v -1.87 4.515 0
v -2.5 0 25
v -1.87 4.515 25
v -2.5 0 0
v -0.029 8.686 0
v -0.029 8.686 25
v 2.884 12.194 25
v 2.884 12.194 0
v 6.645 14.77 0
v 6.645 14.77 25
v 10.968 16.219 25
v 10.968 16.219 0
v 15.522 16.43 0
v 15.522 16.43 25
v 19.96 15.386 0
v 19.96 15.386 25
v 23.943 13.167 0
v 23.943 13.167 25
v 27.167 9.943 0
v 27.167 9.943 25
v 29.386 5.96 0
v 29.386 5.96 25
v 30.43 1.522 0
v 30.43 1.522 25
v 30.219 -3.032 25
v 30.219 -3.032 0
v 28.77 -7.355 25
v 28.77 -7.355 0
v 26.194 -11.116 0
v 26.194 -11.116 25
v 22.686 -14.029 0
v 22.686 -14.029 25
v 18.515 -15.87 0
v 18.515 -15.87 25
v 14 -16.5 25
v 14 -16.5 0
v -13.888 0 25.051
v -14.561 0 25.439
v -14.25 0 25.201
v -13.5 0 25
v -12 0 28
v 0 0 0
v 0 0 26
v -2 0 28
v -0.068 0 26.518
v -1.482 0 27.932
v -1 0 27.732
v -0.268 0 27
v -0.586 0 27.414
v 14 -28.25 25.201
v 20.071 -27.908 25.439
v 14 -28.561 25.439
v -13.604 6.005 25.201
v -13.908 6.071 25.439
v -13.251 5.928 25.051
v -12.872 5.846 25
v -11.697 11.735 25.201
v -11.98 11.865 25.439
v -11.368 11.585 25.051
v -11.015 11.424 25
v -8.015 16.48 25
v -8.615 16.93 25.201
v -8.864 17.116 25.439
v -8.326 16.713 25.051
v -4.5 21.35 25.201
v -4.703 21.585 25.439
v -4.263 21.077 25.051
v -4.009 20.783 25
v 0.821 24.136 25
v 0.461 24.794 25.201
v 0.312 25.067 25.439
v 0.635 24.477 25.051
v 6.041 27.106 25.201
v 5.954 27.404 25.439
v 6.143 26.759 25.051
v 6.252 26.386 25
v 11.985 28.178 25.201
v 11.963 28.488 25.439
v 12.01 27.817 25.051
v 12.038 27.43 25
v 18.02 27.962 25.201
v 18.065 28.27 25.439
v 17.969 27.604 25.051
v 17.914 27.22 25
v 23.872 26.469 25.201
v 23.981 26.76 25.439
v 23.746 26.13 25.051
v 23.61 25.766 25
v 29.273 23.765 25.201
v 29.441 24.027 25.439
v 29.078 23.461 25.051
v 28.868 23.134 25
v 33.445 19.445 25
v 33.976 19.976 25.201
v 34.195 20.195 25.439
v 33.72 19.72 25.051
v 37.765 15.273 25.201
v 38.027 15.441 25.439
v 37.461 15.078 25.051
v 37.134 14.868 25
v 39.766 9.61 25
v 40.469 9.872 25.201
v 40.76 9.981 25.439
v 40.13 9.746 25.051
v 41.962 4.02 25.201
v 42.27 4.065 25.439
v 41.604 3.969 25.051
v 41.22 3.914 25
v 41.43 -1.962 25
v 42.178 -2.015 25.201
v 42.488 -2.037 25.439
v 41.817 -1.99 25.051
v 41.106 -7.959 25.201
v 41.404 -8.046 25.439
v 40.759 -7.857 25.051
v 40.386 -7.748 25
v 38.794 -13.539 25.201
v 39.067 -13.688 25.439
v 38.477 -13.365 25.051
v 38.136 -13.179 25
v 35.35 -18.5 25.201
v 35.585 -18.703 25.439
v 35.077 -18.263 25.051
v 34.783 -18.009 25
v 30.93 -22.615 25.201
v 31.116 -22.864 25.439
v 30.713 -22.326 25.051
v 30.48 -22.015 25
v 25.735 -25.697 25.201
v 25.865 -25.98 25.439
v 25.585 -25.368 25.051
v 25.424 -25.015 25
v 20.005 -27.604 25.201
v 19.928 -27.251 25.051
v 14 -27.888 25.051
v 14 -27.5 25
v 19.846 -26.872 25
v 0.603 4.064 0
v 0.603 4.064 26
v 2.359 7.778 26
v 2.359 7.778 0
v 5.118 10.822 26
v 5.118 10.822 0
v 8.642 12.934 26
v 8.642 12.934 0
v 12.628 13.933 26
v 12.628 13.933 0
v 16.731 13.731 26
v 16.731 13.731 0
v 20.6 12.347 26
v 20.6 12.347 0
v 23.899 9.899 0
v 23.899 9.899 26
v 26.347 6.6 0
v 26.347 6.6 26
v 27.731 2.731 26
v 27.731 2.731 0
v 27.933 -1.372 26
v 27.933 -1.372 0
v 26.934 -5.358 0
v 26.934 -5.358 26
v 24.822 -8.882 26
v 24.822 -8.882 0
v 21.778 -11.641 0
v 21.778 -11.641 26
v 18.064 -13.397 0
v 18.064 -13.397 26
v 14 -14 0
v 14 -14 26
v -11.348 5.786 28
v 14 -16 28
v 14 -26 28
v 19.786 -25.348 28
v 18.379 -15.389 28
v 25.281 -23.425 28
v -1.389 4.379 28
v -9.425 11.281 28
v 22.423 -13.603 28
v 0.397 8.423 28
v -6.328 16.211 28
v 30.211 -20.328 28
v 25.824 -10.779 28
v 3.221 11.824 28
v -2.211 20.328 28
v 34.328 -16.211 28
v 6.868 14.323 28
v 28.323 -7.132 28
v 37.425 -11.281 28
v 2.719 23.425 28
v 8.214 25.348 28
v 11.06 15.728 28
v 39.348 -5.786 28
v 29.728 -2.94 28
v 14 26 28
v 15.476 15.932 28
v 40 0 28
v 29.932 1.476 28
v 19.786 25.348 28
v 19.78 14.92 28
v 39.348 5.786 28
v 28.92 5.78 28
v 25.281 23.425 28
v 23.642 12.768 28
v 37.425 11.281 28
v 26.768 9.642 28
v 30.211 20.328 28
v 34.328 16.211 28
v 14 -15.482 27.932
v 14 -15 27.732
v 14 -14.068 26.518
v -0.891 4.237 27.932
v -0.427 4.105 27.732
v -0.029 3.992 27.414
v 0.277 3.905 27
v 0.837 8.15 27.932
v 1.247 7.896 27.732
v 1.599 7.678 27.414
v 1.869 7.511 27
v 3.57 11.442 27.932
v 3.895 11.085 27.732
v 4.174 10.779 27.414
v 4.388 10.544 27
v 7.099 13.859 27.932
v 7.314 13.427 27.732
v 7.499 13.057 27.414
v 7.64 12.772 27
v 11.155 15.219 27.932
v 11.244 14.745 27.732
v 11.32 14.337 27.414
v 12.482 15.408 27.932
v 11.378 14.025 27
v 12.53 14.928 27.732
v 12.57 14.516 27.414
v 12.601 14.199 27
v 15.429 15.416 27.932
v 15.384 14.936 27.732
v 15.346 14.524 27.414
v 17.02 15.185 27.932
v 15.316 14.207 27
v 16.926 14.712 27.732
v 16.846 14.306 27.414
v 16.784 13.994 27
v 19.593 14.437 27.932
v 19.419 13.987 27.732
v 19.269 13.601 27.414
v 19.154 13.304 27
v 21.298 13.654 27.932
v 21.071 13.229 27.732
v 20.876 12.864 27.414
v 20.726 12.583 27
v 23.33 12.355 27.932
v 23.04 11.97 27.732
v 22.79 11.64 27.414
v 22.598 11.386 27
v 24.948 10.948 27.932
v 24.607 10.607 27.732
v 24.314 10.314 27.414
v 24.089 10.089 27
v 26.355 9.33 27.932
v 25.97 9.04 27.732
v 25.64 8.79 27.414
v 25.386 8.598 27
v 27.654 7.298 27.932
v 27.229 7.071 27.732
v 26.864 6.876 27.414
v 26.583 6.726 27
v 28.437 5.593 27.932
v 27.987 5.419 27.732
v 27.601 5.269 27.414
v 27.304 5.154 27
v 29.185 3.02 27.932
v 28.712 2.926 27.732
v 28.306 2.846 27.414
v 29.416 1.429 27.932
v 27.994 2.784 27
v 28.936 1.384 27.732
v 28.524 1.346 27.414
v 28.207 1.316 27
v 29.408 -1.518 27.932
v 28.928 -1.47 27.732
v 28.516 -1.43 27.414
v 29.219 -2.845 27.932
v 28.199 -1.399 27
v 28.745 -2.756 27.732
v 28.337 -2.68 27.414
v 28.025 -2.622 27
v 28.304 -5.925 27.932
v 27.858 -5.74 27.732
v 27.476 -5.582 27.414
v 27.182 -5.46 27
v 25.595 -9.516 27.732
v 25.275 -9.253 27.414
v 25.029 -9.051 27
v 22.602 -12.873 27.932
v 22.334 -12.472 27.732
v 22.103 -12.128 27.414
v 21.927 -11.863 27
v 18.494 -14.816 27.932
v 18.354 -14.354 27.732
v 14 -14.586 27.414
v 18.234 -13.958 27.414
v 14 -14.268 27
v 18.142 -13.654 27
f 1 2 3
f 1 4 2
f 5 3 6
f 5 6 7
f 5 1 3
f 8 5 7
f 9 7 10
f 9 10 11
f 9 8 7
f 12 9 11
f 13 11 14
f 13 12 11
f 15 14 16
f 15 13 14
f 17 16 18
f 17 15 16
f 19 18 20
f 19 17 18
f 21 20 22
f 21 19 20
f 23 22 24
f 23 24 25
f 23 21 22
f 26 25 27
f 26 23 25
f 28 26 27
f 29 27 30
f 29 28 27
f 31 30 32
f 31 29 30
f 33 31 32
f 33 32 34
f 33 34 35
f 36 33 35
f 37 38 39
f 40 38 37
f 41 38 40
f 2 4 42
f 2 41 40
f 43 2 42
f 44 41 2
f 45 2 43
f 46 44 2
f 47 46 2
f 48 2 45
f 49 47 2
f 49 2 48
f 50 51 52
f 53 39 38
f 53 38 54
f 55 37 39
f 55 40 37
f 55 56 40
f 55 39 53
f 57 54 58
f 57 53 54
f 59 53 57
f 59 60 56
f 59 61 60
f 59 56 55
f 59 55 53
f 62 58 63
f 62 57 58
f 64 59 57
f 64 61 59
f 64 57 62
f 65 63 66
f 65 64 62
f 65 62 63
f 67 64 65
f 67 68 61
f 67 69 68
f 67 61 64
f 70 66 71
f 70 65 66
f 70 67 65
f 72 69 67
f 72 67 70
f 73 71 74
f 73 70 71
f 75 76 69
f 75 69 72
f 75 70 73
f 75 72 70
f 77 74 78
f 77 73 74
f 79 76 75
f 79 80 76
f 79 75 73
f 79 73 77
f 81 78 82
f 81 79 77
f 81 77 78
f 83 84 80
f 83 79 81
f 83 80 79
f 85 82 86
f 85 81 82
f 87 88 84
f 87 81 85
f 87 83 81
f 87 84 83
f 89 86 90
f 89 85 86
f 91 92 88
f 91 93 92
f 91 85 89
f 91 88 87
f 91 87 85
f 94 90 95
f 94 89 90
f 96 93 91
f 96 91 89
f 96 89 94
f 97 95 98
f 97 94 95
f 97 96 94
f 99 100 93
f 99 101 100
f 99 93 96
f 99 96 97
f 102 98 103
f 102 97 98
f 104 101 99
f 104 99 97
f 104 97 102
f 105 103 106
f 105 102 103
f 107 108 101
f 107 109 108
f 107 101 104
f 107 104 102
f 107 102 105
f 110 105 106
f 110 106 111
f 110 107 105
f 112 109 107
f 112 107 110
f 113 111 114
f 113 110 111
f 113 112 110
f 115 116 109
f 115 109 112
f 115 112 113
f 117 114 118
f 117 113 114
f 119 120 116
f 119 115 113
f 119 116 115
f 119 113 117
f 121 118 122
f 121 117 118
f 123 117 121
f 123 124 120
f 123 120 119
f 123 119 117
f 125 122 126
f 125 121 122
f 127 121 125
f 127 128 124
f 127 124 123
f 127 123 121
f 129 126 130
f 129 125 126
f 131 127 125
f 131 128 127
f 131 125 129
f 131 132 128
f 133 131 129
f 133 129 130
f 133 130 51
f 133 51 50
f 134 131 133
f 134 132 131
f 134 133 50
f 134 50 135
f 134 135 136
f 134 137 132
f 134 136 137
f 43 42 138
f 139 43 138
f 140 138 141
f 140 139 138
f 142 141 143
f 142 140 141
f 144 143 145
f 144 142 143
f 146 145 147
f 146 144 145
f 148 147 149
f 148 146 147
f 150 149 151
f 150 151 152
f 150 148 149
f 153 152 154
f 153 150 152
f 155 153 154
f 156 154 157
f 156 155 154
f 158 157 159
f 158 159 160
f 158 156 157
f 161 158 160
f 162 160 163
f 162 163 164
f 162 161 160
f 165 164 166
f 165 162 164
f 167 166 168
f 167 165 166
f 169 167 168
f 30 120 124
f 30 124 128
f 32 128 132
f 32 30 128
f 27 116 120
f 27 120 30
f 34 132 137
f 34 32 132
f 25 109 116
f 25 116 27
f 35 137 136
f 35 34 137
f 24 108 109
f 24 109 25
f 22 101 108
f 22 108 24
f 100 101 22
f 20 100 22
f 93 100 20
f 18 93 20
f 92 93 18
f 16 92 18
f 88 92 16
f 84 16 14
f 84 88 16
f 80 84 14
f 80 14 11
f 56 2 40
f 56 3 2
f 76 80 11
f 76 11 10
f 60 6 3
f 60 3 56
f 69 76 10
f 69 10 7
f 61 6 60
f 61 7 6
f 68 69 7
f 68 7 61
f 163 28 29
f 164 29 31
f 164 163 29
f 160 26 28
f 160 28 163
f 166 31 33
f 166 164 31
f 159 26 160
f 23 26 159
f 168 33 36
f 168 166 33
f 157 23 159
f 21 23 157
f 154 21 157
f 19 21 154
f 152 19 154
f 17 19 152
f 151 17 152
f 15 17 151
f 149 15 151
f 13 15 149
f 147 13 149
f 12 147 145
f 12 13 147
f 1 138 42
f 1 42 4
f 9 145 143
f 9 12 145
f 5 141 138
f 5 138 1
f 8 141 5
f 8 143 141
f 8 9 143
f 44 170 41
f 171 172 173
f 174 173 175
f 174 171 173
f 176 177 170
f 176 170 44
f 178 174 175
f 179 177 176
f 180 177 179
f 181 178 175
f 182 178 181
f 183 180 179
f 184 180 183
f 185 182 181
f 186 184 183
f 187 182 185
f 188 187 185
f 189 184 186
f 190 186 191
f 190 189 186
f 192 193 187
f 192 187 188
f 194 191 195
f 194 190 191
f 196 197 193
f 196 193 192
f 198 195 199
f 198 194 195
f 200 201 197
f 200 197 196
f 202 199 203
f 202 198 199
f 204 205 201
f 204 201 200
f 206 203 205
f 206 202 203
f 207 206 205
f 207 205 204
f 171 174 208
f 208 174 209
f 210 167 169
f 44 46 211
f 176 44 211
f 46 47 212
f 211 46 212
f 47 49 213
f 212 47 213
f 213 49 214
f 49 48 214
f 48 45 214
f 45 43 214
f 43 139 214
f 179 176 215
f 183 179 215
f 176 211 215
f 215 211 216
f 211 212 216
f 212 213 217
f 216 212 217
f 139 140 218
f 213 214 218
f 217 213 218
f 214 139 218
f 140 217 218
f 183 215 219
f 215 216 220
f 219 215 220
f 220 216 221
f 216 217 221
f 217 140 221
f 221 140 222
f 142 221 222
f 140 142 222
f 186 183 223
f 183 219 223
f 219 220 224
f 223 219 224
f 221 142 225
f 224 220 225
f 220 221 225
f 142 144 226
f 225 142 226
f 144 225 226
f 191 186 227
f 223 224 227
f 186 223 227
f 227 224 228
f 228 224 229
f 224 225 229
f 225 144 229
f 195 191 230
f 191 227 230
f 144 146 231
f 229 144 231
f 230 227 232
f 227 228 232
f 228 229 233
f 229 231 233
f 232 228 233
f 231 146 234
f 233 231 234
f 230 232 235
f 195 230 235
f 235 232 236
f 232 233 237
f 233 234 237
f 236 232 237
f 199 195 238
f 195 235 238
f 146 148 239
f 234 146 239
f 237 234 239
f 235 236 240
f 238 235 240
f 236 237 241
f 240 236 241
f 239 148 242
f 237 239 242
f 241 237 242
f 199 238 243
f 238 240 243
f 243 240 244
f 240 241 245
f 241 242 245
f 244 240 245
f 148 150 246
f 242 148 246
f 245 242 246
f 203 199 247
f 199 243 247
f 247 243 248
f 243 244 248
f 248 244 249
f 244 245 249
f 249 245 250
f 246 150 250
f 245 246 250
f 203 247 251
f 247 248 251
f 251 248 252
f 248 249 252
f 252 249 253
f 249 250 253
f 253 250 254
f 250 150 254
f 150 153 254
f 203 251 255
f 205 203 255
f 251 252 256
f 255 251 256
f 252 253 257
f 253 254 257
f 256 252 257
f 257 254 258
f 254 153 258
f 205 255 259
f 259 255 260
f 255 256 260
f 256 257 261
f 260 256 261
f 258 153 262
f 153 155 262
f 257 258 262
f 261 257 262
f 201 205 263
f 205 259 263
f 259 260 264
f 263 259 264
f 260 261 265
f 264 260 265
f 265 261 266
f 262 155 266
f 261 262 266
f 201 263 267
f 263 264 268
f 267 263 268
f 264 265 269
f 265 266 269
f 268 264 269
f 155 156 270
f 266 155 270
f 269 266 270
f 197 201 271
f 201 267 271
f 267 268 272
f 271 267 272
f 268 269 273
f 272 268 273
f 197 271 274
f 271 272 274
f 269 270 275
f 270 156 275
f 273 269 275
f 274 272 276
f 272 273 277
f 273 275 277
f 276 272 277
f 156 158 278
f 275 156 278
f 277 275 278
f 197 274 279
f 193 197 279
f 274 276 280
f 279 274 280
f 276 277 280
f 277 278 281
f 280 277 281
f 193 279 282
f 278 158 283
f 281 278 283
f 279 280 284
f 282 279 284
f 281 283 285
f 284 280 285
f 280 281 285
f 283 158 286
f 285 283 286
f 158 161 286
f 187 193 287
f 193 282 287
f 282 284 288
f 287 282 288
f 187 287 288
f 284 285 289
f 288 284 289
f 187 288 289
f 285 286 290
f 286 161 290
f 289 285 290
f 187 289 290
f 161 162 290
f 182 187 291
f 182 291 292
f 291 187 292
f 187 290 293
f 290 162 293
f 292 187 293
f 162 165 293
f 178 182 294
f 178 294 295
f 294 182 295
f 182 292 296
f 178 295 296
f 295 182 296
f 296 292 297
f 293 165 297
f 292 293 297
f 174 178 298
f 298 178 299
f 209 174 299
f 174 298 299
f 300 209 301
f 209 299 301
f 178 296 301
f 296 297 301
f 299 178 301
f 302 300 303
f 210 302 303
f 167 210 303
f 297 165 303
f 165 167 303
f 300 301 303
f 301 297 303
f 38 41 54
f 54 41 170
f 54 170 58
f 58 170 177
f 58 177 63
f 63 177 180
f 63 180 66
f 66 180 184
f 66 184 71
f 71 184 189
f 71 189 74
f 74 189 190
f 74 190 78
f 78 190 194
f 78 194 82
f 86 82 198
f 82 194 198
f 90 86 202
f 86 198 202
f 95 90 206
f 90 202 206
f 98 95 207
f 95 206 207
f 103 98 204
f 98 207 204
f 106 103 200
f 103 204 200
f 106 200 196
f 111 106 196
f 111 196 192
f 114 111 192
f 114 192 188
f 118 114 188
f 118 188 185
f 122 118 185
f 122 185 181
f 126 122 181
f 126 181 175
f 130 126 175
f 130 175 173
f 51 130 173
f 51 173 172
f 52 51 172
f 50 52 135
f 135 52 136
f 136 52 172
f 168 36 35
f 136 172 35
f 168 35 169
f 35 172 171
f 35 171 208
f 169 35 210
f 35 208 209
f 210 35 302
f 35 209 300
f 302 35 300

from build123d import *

# Parameters (mm, degrees)
F1_ANGLE    = 270
F2_R        = 1.5
F3_T2_ANGLE = 300.5959645066
F4_R        = 2


# Not quite as in the source:
# - a fillet or chamfer that OpenCascade refuses, or shapes differently, is made with other operations: its cross-section is extruded or revolved along the edge and cut away or added


with BuildPart() as f1:
    # F0 (on Front) → F1 (revolve)
    with BuildSketch(Plane.XZ):
        Polygon((-2.5, 0), (0, 0), (0, 28), (-15, 28), (-15, 25), (-12.5, 25), (-2.5, 25), align=None)
    revolve(axis=Axis((14, 0, -3.1492561102), (0, 0, -1)), revolution_arc=F1_ANGLE)

    # F2
    f2_edges = [f1.edges().sort_by_distance(p)[0] for p in [
        (34.506097, 20.506097, 25),
    ]]
    fillet(f2_edges, radius=F2_R)

    # F3: chamfer of 3 on 1 edges, made by hand

    # F3_s1 → F3_t2 (revolve, cut)
    with BuildSketch(Plane(origin=(0.974554854, -3.562865531, 0), x_dir=(0, 0, 1), z_dir=(0.2638390816, -0.9645667105, 0))):
        Polygon((25, 15.496066053), (28, 12.496066053), (28, 15.496066053), align=None)
    revolve(axis=Axis((14, 0, 28), (0, 0, -1)), revolution_arc=F3_T2_ANGLE, mode=Mode.SUBTRACT)

    # F4
    f4_edges = [f1.edges().sort_by_distance(p)[0] for p in [
        (23.899495, 9.899495, 28),
    ]]
    fillet(f4_edges, radius=F4_R)


solid = f1.part
